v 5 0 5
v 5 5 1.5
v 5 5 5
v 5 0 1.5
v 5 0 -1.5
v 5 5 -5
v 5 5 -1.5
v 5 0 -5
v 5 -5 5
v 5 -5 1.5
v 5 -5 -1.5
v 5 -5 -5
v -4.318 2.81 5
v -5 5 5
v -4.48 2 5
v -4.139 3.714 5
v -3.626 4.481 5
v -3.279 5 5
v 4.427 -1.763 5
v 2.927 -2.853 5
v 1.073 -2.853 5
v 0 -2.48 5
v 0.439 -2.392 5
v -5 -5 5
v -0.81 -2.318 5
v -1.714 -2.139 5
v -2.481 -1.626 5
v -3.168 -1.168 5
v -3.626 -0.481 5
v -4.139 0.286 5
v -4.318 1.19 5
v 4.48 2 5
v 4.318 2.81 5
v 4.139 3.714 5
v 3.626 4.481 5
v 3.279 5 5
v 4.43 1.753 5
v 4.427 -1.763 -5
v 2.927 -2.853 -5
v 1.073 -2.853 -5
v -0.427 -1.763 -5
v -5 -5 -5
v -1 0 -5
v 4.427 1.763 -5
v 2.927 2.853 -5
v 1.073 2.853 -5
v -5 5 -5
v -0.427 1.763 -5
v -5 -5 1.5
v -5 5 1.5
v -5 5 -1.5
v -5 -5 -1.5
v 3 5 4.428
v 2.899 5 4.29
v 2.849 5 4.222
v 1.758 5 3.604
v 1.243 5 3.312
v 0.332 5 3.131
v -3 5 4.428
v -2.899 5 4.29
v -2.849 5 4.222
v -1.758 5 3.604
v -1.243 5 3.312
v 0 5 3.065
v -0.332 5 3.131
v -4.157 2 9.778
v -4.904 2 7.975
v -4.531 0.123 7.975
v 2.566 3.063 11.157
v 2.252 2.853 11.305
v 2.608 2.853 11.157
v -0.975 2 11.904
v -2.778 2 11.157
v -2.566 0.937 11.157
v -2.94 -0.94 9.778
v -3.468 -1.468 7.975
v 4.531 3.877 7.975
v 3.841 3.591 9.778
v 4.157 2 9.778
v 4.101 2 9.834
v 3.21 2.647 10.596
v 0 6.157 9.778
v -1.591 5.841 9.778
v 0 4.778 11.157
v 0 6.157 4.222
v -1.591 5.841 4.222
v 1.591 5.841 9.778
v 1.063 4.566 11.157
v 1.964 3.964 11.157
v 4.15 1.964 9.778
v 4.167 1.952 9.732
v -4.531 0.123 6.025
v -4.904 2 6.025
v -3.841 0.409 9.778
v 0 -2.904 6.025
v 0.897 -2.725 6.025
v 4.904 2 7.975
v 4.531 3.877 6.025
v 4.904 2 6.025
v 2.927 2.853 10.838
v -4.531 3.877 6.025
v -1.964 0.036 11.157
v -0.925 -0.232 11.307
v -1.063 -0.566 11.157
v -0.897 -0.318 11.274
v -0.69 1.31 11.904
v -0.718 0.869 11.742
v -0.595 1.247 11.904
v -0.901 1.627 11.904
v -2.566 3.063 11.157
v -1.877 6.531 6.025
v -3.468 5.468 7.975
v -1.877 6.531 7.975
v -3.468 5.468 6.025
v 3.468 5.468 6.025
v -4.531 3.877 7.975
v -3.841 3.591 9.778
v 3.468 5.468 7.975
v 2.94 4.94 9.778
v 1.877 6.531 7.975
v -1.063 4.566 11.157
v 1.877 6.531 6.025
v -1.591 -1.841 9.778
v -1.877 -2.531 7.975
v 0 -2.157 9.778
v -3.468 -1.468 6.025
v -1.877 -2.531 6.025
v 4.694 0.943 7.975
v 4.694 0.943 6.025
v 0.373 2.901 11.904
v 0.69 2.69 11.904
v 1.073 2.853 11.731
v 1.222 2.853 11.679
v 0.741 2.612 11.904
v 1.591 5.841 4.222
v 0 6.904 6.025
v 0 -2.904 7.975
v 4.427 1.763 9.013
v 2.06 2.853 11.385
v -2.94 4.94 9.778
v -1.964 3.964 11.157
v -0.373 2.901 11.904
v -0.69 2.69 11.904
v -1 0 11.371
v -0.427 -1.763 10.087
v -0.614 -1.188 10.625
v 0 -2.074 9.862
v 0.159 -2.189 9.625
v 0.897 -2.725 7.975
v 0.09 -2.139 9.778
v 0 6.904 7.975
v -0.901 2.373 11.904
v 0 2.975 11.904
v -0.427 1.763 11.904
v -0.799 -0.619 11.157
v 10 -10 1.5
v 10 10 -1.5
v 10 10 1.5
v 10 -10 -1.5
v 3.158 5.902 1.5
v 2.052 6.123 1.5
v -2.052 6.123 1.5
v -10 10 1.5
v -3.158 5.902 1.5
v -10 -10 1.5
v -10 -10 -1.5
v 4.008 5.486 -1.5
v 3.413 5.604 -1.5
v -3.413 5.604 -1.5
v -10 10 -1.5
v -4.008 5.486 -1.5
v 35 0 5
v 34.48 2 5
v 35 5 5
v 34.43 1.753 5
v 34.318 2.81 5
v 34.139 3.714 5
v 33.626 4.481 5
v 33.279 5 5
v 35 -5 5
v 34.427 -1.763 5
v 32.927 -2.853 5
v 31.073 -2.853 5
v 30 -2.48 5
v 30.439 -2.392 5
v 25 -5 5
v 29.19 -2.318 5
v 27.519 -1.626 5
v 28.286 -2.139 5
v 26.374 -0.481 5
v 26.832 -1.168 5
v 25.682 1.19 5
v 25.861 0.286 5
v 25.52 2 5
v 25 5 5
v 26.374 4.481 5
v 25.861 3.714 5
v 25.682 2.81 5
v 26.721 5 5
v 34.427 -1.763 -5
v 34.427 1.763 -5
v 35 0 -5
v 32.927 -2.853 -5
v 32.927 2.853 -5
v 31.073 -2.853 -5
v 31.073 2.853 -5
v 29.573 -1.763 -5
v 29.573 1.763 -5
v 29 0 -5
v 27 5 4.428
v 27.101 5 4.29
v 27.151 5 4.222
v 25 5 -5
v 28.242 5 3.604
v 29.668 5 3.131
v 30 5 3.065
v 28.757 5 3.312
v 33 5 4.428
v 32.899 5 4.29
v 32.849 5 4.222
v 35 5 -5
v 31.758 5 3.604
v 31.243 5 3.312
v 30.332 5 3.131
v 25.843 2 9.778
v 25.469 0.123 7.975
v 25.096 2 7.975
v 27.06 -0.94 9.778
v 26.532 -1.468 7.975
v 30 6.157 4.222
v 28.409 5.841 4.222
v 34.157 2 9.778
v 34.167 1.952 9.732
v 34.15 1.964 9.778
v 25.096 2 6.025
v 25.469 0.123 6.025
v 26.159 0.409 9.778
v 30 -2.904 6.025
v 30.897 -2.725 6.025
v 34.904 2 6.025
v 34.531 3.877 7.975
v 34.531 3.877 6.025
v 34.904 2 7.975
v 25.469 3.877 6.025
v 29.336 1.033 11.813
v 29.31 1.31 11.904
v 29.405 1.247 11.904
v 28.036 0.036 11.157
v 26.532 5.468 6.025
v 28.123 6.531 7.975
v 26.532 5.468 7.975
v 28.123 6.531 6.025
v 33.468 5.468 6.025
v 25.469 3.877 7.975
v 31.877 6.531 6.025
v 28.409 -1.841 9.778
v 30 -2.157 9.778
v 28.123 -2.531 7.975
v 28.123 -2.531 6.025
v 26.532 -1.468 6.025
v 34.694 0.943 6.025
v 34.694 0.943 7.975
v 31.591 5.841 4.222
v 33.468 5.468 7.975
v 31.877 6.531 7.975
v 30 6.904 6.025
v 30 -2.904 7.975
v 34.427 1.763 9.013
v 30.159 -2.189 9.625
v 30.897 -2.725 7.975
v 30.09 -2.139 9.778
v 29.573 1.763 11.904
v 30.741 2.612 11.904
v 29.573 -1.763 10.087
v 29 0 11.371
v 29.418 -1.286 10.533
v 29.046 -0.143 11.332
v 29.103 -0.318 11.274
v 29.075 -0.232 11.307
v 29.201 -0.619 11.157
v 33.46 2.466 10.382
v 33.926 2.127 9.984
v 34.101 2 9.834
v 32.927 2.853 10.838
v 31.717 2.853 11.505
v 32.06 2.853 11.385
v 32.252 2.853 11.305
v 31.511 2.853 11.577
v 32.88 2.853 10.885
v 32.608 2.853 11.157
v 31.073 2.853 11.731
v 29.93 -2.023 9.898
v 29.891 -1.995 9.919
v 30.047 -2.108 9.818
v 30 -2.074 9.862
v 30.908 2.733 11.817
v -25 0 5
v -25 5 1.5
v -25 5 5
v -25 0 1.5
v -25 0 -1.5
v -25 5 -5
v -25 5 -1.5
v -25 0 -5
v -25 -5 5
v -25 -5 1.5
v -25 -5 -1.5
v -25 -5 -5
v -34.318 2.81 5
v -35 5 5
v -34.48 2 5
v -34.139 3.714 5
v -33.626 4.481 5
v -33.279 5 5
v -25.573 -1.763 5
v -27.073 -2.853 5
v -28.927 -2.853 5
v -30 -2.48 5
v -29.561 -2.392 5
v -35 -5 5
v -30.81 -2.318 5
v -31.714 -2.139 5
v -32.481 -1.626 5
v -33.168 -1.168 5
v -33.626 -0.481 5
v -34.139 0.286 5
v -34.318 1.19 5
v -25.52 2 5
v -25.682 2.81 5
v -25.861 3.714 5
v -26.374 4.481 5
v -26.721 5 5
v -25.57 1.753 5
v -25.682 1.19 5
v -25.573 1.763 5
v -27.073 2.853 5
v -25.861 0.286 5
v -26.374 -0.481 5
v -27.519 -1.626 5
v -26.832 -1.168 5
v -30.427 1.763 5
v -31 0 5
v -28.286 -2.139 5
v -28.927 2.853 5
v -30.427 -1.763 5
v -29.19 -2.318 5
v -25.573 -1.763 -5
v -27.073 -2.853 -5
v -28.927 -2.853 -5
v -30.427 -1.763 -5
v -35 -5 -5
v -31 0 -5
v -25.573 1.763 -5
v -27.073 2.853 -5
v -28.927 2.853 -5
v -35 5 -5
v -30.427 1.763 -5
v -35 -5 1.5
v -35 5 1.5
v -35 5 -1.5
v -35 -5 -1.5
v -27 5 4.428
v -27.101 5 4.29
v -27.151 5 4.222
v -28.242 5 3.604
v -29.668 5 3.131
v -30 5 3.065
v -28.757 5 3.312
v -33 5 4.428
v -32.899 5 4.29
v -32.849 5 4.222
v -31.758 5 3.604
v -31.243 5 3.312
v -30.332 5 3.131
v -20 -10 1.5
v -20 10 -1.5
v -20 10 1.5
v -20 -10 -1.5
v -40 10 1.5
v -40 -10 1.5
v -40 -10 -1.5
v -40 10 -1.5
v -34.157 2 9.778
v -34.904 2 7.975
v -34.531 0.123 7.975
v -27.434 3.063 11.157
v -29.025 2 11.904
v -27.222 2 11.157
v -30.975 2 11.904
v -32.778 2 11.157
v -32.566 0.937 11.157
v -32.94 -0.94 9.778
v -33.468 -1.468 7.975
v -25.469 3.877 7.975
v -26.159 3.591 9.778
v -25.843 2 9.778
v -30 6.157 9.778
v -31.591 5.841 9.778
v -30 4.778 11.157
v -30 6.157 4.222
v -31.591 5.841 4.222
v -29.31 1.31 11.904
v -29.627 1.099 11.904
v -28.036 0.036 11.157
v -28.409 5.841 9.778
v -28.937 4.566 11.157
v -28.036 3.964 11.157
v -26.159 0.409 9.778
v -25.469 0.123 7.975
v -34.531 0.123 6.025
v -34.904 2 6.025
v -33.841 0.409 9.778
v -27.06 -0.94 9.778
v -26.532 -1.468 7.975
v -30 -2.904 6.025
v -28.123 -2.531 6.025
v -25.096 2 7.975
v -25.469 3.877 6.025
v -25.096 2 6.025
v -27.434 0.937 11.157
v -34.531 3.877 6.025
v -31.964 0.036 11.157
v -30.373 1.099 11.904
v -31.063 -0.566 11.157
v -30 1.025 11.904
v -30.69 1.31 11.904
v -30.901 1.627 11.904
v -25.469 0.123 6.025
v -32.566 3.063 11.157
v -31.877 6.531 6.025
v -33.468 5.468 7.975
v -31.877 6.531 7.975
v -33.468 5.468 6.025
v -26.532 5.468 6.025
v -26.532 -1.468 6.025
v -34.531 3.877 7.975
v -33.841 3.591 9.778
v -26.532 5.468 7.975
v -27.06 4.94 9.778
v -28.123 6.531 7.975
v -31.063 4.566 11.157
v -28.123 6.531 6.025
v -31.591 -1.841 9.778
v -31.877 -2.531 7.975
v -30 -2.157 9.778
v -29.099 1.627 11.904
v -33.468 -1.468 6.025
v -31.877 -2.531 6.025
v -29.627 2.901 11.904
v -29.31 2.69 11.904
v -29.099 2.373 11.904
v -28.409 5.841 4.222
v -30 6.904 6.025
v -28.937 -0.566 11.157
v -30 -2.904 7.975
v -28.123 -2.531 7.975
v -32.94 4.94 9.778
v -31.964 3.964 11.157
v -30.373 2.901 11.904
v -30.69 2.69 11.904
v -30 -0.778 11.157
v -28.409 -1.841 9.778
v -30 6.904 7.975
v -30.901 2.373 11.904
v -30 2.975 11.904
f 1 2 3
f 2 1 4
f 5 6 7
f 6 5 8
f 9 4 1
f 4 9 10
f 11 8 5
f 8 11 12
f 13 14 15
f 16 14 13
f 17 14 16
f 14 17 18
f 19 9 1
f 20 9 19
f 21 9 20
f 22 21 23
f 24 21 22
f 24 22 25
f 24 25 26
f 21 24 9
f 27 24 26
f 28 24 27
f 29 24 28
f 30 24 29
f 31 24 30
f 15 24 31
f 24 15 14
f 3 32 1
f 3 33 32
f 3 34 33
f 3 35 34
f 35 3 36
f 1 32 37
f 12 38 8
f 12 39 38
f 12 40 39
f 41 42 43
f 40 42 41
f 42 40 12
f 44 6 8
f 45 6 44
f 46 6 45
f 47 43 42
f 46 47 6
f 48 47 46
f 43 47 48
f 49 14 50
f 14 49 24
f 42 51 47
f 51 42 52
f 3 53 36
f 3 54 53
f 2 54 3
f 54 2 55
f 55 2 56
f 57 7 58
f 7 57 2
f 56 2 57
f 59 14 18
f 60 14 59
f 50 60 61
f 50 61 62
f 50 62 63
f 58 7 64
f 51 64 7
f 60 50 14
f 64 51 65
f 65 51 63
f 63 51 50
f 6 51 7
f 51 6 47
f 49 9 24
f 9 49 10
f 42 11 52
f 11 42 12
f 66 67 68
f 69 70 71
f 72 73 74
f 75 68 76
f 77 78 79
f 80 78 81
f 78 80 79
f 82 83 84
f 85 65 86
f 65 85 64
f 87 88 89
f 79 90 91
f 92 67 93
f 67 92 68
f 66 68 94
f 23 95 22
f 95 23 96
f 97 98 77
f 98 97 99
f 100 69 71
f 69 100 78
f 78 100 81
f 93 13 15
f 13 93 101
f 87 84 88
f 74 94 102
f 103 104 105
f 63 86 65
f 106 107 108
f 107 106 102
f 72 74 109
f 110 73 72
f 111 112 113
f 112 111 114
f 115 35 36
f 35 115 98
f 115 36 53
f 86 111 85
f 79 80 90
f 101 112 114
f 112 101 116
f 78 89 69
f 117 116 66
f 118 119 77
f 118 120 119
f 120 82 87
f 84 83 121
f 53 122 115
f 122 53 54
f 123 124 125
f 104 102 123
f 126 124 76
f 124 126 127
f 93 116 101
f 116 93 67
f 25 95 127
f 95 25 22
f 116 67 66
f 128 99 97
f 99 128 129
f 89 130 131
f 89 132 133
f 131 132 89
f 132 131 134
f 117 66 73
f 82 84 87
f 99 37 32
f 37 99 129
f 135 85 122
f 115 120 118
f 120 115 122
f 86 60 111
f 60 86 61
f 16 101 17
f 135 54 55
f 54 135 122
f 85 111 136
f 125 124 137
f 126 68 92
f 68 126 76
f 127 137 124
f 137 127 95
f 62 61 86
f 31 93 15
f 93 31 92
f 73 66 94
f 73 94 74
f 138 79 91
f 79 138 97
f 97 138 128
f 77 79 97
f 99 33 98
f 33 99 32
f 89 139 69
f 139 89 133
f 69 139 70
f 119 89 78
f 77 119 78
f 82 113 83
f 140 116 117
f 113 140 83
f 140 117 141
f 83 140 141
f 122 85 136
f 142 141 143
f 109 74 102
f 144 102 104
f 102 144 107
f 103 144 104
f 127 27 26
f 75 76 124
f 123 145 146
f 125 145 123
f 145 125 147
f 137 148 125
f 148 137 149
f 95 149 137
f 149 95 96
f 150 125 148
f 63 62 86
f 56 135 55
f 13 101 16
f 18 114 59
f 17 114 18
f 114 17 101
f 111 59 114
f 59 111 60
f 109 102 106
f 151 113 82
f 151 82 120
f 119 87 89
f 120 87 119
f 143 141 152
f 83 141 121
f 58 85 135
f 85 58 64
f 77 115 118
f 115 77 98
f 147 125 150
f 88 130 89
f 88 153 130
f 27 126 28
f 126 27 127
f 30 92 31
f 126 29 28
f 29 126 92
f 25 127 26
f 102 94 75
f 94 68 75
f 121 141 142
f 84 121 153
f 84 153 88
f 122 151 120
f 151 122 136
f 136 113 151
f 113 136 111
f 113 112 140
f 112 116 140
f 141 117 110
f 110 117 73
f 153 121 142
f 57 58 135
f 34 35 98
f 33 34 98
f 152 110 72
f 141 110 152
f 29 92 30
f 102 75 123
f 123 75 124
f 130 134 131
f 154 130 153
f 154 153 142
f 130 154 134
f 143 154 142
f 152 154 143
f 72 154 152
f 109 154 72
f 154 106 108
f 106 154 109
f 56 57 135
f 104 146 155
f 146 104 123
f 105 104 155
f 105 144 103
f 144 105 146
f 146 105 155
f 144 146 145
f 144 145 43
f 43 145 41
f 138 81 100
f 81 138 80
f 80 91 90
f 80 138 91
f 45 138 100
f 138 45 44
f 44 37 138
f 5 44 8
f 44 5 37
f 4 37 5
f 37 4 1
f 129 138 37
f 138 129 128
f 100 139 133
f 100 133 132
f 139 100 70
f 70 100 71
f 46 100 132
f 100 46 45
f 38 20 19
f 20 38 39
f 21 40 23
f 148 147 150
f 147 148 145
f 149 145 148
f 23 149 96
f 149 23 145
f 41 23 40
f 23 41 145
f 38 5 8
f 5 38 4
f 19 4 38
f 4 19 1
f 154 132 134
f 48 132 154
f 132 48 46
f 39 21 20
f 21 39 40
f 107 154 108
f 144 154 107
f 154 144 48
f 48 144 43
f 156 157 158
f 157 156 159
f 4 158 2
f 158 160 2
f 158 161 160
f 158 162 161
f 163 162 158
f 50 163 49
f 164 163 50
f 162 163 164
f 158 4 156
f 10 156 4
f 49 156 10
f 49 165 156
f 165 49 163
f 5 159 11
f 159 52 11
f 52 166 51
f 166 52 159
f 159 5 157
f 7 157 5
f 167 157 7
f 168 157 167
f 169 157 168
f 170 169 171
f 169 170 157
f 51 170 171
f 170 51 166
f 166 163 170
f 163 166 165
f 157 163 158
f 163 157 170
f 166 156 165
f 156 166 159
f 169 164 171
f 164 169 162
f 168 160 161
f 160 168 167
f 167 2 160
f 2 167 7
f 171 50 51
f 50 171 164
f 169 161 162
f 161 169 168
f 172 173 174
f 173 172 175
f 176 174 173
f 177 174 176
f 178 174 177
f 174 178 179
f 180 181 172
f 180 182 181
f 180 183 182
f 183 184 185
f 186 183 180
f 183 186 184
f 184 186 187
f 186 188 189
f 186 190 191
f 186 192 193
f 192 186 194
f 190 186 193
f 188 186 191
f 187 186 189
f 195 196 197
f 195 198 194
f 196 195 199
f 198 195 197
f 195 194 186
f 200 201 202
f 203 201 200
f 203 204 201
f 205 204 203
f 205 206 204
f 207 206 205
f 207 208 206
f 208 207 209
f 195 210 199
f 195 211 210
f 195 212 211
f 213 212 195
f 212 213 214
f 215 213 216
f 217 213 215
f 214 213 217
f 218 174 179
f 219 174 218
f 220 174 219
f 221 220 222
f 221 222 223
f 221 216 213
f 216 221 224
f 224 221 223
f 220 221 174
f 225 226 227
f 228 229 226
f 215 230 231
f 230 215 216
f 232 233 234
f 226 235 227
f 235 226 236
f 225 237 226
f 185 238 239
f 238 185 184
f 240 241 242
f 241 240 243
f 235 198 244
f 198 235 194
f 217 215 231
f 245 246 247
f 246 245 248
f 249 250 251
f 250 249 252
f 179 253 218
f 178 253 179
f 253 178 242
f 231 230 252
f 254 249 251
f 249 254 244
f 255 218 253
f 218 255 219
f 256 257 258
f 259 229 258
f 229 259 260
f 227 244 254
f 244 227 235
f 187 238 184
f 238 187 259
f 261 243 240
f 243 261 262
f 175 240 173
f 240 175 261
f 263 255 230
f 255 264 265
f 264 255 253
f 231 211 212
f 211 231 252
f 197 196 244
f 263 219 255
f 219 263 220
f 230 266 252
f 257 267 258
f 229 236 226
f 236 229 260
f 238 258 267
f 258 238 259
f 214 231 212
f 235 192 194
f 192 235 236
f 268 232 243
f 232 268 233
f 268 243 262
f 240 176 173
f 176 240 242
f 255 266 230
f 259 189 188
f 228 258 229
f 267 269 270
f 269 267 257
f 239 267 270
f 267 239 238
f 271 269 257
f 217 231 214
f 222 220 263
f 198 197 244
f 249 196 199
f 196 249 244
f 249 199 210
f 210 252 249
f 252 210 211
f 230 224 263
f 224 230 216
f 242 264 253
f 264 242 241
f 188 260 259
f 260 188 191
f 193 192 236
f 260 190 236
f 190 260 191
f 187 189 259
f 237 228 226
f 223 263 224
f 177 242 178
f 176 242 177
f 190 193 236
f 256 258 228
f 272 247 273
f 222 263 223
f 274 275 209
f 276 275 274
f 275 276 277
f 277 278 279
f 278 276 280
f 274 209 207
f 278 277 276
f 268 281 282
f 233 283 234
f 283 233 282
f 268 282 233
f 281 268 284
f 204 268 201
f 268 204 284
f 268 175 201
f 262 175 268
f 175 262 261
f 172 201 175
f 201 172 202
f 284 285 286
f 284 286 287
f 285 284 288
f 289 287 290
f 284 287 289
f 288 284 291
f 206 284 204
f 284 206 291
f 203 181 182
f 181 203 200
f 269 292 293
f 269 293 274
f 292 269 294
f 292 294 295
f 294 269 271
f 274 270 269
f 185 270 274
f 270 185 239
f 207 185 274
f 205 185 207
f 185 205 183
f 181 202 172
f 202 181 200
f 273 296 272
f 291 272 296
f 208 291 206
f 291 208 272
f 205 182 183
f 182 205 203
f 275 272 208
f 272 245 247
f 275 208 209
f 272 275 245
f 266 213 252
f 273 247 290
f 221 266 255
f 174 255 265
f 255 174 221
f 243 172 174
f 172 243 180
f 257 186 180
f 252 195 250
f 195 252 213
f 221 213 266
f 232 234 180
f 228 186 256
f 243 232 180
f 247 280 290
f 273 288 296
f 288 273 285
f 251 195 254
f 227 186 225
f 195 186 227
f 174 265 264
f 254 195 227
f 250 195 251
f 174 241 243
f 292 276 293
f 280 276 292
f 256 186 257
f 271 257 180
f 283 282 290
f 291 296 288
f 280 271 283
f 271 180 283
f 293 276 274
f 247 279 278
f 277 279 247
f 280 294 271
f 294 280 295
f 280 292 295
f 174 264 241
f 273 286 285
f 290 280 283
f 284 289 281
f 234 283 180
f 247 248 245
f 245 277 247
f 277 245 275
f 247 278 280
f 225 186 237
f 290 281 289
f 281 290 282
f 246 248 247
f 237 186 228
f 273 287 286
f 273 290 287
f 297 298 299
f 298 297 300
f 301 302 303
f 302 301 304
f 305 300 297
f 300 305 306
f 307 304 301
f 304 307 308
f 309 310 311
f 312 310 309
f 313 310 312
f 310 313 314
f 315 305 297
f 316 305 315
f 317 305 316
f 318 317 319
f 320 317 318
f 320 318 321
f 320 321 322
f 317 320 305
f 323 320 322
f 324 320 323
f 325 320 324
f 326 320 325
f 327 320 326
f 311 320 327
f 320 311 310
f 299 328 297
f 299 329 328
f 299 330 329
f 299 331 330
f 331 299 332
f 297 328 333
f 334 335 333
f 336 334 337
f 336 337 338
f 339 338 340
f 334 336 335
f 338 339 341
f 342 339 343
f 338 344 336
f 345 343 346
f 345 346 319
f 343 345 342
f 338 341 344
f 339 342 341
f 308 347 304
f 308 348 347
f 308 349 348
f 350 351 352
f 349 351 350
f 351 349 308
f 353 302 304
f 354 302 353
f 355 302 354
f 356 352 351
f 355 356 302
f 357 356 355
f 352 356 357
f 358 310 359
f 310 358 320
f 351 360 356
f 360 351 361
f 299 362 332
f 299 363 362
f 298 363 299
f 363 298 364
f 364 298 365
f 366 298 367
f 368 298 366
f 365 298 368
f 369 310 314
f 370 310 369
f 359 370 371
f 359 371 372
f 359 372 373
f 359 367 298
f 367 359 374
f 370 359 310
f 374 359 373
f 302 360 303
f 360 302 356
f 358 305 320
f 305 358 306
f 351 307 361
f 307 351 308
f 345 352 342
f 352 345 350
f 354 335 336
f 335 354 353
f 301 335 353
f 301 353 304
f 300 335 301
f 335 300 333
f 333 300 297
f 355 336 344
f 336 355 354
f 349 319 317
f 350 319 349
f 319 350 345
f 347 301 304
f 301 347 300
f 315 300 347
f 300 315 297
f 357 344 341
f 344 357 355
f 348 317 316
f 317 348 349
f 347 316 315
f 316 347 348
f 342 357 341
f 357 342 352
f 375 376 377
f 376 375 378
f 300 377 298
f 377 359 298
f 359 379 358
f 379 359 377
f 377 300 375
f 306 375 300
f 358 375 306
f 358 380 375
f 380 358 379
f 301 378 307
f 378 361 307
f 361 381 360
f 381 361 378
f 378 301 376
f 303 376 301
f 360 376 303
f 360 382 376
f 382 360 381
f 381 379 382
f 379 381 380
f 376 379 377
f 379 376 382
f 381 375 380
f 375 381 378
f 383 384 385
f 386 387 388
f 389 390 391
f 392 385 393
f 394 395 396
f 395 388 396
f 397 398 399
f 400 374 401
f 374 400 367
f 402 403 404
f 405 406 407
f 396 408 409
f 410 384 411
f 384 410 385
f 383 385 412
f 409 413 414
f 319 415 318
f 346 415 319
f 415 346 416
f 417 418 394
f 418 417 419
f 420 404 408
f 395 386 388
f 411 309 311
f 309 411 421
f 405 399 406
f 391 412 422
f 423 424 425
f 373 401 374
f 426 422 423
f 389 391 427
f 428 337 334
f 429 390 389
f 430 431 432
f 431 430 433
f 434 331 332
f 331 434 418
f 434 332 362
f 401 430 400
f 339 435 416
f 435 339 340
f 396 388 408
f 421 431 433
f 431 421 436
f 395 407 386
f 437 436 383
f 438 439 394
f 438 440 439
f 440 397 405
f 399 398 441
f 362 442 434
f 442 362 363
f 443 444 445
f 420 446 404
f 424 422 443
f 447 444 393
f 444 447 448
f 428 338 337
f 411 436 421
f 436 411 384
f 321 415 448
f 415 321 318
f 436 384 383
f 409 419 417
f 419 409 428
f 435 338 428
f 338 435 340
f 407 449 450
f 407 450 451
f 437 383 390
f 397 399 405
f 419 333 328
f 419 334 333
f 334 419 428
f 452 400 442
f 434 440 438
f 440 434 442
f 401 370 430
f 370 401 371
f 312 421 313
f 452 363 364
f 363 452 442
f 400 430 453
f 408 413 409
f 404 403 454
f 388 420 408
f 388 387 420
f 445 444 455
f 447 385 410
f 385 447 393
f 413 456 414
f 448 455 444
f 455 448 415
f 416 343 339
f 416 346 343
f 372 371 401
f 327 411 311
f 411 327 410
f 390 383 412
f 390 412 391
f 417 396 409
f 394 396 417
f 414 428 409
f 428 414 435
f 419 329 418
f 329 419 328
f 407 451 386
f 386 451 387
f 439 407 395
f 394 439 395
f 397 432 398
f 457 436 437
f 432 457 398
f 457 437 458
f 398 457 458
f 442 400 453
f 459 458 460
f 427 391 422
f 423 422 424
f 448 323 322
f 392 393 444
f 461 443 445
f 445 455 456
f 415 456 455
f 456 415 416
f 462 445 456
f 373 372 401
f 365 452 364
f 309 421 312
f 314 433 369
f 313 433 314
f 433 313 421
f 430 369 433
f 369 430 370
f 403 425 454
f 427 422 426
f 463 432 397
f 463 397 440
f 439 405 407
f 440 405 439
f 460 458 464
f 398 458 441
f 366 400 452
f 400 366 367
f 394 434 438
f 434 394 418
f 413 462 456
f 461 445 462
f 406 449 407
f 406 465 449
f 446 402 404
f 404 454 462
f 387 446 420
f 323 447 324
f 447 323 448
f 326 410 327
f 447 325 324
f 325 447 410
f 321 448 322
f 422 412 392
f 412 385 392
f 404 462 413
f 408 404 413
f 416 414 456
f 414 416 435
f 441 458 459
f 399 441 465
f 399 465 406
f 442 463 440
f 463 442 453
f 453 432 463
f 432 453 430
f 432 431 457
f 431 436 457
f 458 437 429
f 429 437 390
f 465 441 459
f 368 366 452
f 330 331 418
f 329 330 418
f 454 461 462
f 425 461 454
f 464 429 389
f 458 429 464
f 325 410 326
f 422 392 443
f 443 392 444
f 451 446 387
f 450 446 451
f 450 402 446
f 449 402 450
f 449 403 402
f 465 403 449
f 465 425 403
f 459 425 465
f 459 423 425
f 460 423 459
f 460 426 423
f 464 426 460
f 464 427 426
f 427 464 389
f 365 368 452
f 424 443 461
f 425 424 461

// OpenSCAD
/*
just plan old comon things I have found my self wanting to do.
*/

module Invert() {
for (i=[0:$children]) {
    


    difference(){
            hull(){children(i);}
            children(i);
        }
    }
}
module Invert_Example1()
{

//a shape with a hole
Invert() {
        difference(){
             union(){
                cube(size=[10, 10, 10], center=true);
                 translate([0, 2, 7]) {
                 sphere(r=5);
                 }
             }
             
                 translate([2, 0, 0]) {
           cylinder(r=3, h=51, center=true);
            }
        }
}

}
/*
keeps all the holes in the first child this assumes the fisrt child is relitively simple
*/
module keepHoles_union() {

    difference(){
        children();
        //the parts to delete
       Invert() {
           
            //hull(){children(0);}
            children(0);
        }
   }
}



module keepHoles_union_Example1()
{
    
    keepHoles_union()
    {
        //a cube with a hole
        difference(){
             cube(size=[10, 10, 10], center=true);
                 translate([5, 0, 0]) {
           cylinder(r=3, h=11, center=true);
            }
        }
        /// this is he second child
        cube(size=[20, 20, 3], center=true);

    }

}


module keepHoles_union_Example2()
{
    
    keepHoles_union()
    {
        //a shape with a hole
        difference(){
             union(){
                cube(size=[10, 10, 10], center=true);
                 translate([0, 2, 7]) {
                 sphere(r=5);
                 }
             }
             
                 translate([2, 0, 0]) {
           cylinder(r=3, h=51, center=true);
            }
        }
        /// this is he second child
        cube(size=[20, 20, 3], center=true);

    }

}

module keepHoles_union_Example3()
{
    
    keepHoles_union()
    {
        //a shape with a hole
        difference(){
          
                cube(size=[10, 10, 10], center=true);
                translate([2, 0, 0]) {
           cylinder(r=3, h=51, center=true);
            }
        }
        /// this is he second child
        cube(size=[20, 20, 3], center=true);
        translate([0, 2, 7]) {
        sphere(r=5);
        }
    }

}



//keepHoles_union_Example1();
keepHoles_union_Example2();
   translate([30, 0, 0]) Invert_Example1();
   

   translate([-30, 0, 0]) keepHoles_union_Example3();


   

module spoke_ify(number_of_spokes=5)
{
    angle= 360/number_of_spokes;
    for(s=[0:number_of_spokes])
      rotate (s*angle,[0,0,1]){ children();} 
    }
